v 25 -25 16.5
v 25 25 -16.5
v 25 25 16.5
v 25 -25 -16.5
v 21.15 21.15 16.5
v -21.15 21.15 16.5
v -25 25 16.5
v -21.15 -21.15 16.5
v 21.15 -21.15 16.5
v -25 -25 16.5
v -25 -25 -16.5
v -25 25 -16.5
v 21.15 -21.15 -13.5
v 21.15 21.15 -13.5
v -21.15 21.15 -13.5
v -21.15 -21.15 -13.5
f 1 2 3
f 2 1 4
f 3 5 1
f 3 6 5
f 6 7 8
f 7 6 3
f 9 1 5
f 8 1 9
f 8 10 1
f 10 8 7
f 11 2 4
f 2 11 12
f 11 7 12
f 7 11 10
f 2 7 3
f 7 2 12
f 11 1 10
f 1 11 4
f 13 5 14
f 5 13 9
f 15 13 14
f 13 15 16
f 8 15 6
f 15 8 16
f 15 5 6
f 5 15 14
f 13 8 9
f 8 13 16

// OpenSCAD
Height=33; //
X=42.3; //
Y=42.3; //

difference() {
        
    cube([50,50,Height],center=true);
    translate([0,0,3])
    cube([X,Y,Height],center=true);
}
